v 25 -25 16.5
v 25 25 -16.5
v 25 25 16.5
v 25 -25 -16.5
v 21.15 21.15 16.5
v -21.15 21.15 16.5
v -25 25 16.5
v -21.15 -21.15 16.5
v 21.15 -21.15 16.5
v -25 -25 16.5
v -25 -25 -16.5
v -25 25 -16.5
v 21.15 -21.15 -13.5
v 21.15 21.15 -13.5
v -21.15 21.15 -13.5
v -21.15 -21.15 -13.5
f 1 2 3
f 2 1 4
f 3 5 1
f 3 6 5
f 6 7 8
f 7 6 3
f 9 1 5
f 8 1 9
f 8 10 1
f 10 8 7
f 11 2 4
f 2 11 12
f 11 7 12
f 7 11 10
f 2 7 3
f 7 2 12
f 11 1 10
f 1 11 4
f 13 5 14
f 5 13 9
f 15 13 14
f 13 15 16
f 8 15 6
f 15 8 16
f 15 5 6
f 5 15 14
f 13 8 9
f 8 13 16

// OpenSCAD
Height=33; //
X=42.3; //
Y=42.3; //

difference() {
        
    cube([50,50,Height],center=true);
    translate([0,0,3])
    cube([X,Y,Height],center=true);
}
